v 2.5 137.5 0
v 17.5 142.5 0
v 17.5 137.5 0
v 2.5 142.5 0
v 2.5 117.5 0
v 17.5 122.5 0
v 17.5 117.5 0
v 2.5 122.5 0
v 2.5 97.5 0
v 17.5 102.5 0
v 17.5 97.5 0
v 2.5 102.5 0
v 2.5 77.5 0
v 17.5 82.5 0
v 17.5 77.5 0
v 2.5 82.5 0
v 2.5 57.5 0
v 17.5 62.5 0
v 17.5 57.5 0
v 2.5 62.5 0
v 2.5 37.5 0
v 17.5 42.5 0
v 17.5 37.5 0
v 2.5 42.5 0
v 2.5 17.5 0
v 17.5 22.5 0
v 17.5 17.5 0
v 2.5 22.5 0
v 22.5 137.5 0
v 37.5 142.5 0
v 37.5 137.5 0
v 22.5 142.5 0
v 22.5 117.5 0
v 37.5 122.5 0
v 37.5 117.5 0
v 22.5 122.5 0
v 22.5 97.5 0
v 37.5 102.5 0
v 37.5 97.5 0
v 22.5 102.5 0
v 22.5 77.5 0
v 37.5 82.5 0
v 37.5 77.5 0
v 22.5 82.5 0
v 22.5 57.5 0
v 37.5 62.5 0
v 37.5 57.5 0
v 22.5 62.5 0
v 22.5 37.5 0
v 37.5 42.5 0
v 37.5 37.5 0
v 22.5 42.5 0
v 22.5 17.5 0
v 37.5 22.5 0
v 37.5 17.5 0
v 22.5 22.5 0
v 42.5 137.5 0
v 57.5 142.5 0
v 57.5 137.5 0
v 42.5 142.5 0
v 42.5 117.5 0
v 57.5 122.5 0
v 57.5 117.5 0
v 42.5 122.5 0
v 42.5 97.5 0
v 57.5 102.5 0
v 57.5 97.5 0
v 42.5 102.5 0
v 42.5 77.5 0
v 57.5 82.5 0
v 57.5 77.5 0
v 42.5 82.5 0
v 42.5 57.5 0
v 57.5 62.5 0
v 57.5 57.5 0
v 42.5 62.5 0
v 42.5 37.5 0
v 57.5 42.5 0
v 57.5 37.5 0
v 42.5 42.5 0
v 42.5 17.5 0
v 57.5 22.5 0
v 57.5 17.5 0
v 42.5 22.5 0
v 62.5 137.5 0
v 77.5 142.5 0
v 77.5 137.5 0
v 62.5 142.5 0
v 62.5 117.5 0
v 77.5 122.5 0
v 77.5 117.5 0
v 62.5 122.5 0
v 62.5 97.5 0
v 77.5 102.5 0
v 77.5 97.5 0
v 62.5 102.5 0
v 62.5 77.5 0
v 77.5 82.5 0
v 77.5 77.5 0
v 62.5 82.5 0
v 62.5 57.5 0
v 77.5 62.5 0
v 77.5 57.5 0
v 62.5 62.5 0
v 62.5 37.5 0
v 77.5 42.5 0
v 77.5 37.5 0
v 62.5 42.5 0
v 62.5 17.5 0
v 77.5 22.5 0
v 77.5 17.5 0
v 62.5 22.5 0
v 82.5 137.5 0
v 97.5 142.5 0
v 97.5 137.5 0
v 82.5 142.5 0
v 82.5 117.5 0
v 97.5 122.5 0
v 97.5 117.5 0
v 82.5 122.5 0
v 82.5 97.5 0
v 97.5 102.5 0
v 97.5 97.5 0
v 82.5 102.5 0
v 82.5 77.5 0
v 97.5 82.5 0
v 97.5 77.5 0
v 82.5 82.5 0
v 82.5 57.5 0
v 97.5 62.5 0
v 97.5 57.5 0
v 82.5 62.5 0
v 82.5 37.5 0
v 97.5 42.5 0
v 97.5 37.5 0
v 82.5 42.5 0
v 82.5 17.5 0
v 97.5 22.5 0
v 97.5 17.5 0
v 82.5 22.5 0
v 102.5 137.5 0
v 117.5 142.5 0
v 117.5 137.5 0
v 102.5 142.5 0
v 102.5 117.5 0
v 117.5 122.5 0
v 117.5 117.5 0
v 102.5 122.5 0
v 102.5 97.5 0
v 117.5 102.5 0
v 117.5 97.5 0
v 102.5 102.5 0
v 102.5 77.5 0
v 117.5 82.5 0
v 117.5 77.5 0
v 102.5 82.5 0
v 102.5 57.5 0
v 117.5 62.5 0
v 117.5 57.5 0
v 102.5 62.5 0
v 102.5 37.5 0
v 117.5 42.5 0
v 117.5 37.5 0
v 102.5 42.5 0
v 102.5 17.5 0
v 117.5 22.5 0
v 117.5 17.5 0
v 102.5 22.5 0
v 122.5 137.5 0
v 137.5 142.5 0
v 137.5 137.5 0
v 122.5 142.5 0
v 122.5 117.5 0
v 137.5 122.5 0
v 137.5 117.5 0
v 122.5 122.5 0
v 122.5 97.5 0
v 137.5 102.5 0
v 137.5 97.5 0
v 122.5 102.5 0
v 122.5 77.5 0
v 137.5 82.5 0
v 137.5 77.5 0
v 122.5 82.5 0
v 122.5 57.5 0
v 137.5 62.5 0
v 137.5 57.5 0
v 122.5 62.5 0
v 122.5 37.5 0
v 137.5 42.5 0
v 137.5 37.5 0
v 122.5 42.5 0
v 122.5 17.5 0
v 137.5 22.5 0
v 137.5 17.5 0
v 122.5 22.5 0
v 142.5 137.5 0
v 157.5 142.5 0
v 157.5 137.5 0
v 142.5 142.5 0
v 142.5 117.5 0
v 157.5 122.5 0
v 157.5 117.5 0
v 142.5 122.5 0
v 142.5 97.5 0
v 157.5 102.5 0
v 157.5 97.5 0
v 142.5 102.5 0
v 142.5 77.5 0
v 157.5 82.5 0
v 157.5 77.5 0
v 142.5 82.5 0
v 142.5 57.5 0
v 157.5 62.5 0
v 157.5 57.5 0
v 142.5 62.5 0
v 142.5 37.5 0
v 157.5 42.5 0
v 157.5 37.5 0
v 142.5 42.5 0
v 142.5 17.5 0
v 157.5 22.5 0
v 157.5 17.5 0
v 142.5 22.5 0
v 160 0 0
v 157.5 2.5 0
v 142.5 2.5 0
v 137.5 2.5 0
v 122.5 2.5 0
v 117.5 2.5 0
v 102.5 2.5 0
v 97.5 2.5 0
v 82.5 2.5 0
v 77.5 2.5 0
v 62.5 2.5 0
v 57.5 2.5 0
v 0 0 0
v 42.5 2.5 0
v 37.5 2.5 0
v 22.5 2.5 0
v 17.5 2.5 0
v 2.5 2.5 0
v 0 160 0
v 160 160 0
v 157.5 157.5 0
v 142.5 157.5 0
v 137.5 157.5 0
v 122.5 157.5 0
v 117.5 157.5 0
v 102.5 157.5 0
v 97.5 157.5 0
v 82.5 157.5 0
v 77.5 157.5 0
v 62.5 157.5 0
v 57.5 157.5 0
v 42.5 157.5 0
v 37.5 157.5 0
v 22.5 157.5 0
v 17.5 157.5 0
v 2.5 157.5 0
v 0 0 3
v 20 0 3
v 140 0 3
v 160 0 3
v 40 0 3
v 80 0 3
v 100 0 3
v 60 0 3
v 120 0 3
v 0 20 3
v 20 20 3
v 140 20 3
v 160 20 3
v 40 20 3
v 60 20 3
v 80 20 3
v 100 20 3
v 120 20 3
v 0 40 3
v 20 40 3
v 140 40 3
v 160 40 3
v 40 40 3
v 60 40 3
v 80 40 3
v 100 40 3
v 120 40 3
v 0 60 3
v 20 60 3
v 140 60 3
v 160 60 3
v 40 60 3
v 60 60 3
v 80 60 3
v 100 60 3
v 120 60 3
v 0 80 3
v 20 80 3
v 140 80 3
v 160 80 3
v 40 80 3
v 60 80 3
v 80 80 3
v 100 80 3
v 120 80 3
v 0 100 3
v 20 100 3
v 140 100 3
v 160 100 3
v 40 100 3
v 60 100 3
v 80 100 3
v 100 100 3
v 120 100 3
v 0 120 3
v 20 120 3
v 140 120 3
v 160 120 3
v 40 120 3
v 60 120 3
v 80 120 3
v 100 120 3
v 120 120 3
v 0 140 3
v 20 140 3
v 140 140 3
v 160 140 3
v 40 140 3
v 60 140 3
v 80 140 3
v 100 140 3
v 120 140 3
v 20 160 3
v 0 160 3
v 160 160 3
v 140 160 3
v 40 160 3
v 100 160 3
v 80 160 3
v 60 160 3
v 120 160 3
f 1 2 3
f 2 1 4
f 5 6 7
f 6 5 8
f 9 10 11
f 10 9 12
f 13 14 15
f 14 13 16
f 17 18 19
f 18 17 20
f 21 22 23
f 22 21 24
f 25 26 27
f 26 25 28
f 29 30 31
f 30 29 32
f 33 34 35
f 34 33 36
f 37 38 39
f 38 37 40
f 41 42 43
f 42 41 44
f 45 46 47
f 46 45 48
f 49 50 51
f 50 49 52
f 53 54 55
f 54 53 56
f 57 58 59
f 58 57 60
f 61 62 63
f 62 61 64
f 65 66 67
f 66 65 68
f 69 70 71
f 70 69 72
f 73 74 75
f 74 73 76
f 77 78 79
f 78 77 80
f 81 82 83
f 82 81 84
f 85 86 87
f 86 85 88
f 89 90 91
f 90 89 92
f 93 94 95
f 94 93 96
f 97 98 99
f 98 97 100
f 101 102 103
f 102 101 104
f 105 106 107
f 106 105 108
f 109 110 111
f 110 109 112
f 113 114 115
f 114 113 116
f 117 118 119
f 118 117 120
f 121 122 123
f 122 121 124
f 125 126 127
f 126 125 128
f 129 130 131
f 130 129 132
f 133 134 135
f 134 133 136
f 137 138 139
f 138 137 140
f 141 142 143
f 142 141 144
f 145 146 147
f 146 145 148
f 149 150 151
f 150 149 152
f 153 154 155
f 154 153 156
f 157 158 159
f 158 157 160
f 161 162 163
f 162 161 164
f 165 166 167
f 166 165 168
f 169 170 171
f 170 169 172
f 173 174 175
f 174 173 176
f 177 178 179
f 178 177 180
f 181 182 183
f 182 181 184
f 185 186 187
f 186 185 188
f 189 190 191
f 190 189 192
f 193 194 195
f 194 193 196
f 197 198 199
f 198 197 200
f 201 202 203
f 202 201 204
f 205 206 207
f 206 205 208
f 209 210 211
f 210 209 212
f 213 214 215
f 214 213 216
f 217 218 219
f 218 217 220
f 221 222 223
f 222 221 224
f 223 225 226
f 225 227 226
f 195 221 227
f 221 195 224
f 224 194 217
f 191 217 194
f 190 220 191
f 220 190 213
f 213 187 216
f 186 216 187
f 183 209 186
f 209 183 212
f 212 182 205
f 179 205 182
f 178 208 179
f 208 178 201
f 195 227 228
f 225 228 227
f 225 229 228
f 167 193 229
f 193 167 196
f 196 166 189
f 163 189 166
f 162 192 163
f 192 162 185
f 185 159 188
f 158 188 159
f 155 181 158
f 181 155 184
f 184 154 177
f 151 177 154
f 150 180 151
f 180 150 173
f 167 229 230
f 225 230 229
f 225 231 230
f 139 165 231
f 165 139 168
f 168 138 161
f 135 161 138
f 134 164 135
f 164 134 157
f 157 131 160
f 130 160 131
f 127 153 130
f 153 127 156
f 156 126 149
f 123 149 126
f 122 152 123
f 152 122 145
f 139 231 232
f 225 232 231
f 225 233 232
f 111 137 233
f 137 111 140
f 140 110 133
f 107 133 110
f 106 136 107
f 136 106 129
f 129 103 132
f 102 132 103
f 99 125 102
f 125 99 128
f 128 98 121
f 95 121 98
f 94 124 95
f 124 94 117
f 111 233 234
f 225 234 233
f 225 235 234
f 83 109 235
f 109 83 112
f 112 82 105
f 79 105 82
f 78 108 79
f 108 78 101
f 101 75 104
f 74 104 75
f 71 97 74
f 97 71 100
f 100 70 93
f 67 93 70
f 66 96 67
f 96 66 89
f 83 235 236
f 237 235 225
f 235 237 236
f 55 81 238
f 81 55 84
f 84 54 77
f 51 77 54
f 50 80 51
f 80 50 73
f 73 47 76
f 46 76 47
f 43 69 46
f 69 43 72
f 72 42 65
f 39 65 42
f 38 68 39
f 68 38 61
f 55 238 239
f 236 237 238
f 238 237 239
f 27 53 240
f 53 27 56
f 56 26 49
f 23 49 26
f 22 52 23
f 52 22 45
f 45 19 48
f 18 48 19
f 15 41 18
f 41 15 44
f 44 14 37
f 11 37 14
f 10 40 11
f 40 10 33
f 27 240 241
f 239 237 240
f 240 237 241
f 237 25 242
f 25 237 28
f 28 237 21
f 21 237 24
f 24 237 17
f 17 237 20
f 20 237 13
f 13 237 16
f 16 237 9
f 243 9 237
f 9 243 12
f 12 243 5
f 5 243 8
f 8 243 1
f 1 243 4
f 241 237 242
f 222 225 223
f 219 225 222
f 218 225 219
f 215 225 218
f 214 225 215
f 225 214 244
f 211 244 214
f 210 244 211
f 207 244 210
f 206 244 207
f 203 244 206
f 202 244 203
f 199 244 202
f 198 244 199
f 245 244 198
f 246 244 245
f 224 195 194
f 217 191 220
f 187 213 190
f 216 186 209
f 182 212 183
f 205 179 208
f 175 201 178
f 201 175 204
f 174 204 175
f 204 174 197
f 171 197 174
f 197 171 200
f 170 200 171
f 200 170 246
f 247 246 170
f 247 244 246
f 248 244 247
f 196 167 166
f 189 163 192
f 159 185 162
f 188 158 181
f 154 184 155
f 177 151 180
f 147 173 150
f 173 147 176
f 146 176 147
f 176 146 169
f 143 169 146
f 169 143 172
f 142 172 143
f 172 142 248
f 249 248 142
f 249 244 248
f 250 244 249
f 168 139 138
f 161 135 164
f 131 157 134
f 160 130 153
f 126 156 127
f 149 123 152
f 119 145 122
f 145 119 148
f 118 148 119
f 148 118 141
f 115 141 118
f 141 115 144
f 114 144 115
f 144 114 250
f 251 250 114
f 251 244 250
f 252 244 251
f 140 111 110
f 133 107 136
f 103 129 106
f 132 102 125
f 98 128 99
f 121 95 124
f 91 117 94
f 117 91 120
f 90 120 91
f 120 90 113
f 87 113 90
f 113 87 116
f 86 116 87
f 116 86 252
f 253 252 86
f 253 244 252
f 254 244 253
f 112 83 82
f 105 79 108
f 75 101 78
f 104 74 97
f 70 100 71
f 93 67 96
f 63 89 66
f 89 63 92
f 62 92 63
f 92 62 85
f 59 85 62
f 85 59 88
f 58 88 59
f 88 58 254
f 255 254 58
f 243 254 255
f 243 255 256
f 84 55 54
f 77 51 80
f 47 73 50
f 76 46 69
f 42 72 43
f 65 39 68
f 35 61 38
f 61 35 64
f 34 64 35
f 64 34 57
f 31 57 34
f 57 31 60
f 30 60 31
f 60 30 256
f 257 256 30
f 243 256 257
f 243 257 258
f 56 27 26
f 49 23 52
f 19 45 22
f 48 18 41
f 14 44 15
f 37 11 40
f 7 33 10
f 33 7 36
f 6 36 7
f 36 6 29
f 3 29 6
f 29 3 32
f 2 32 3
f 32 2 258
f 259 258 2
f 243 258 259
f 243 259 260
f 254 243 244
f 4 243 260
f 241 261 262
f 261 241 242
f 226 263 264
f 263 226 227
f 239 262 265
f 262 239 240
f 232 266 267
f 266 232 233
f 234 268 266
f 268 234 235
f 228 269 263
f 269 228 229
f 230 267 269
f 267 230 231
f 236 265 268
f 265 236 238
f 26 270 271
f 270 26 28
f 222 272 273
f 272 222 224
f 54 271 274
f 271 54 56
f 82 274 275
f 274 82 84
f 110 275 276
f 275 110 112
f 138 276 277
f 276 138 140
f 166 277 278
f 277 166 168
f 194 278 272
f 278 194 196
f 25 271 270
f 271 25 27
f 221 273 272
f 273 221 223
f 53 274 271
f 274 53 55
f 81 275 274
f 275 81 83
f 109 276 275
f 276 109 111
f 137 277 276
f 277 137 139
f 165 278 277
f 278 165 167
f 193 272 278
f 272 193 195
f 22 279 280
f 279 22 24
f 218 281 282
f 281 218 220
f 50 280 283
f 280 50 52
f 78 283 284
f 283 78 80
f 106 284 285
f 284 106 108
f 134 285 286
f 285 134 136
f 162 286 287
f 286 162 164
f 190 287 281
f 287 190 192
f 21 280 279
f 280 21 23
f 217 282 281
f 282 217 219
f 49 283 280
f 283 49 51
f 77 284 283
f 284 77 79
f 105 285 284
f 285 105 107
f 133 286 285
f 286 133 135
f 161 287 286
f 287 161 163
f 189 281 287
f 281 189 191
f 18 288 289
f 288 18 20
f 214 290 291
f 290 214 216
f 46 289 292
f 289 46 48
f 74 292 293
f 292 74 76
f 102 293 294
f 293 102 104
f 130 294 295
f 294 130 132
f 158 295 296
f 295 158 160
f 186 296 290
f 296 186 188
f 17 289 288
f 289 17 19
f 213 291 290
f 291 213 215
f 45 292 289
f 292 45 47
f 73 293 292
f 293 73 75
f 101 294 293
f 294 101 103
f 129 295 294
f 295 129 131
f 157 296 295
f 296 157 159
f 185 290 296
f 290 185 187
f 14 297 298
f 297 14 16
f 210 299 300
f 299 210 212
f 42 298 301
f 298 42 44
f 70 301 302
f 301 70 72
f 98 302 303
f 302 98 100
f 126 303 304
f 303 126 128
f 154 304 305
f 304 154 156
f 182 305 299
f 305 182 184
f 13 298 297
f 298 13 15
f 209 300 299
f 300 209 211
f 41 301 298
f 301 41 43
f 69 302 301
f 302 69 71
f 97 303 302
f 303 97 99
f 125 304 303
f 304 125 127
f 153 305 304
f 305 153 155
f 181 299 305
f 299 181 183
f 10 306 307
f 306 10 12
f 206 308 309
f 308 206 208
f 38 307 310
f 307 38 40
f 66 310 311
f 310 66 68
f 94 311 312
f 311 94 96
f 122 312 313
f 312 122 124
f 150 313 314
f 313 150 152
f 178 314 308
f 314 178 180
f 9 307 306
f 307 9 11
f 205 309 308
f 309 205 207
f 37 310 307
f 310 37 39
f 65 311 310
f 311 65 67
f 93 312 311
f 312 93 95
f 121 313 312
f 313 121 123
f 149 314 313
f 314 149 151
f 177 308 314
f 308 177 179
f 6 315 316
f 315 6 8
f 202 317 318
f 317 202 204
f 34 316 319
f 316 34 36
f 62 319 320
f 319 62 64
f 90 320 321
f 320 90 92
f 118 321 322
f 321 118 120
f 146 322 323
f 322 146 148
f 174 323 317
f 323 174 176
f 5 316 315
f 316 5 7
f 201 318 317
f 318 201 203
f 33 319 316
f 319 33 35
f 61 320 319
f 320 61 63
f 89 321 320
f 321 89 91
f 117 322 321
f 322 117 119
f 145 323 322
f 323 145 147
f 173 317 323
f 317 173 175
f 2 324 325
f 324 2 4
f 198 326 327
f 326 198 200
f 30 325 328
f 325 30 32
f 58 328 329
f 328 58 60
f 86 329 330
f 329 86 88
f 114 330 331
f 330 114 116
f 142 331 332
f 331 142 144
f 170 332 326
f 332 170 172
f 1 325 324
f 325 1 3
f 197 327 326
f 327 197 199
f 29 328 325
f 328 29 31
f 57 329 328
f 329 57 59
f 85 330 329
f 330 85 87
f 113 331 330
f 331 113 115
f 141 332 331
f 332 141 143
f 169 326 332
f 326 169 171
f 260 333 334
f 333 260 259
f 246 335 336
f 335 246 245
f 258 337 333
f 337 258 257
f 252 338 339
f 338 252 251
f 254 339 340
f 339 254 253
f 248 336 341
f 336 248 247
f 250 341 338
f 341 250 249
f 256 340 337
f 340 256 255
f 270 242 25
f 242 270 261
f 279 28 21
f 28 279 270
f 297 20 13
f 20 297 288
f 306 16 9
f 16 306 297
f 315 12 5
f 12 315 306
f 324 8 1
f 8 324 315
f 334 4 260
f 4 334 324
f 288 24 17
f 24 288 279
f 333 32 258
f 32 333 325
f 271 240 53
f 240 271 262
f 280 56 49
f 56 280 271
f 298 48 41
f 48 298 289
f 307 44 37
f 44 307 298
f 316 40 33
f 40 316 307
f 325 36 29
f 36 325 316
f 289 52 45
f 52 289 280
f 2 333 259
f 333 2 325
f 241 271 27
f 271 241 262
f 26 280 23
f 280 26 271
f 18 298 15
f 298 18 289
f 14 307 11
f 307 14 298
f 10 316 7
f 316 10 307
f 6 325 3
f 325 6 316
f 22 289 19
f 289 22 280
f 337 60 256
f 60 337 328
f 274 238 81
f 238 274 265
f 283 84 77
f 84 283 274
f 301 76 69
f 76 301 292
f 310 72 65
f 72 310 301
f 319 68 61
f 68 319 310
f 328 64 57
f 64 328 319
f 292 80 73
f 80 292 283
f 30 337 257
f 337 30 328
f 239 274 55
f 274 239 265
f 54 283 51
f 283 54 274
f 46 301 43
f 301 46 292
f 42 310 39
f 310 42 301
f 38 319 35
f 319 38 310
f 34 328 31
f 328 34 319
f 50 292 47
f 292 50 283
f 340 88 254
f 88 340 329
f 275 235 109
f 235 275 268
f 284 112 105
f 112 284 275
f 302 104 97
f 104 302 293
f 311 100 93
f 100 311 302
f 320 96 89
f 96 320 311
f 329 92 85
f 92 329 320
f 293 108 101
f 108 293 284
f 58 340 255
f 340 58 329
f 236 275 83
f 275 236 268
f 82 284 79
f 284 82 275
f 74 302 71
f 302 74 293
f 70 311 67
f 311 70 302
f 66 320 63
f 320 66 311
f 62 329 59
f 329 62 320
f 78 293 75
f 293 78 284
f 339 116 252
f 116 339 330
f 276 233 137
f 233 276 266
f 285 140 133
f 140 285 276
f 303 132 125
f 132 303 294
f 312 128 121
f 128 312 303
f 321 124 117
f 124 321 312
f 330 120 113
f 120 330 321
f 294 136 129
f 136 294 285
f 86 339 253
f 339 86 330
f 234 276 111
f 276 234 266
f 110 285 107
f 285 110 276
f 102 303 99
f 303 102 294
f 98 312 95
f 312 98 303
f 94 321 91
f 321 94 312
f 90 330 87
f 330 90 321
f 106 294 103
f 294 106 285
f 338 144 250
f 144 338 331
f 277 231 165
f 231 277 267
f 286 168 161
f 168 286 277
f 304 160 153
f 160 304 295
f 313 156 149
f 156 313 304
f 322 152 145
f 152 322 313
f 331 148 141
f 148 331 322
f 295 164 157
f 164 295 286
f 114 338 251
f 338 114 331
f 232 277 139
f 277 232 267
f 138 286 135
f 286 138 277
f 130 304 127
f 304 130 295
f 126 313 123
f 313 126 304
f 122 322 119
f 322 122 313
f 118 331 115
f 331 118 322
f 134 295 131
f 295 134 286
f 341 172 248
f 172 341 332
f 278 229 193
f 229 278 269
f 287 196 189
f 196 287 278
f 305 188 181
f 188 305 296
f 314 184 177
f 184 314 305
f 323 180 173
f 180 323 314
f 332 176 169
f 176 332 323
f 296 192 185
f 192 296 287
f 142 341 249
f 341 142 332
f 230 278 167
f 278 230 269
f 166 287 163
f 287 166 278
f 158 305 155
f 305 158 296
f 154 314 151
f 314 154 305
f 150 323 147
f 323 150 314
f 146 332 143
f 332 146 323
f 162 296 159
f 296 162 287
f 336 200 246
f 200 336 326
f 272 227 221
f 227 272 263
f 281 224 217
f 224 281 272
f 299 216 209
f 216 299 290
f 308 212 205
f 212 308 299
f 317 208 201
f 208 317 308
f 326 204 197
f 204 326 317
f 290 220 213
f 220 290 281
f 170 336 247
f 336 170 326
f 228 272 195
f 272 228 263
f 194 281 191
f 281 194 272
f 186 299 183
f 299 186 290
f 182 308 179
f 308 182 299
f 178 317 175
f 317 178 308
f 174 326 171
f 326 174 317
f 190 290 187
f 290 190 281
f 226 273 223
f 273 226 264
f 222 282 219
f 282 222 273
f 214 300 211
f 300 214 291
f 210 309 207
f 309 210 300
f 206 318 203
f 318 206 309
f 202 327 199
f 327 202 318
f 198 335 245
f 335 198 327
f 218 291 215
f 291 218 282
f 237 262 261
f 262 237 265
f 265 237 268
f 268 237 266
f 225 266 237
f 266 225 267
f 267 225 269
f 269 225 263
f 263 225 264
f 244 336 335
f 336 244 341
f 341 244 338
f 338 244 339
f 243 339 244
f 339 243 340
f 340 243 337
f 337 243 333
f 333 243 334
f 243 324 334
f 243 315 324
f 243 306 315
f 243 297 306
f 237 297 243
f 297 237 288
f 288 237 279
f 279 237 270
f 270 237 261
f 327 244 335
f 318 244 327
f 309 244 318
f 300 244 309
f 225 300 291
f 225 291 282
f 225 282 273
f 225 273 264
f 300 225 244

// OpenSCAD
// file: ../common.scad
BASE_TILE_SIZE=20;
BASE_WIDTH=5;
PEAK_HEIGHT=3;

BOX_HEIGHT = 69;
BOX_CLEARENCE = 15.75;

function box_height() = BOX_HEIGHT;
function box_clearence() = BOX_CLEARENCE;
function max_height() = BOX_HEIGHT - BOX_CLEARENCE;

function y_up() = [90, 0, 0];
function x_up() = [90, 0, 90];

function min_floor_offset(wall_width) = wall_width + PEAK_HEIGHT;
function tri_mid() = BASE_WIDTH / 2;
function triangle() = [[0, 0],[BASE_WIDTH, 0],[tri_mid(), PEAK_HEIGHT]];
function base_tile_size() = BASE_TILE_SIZE;
function peak_height() = PEAK_HEIGHT;

module grid(width, depth, direction) {
    length = (direction == "x") ? width : depth;
    slot_length = (direction == "x") ? depth : width;
    translate_z = (direction == "x") ? -slot_length : 0;
    rot = (direction == "x") ? y_up() : x_up();

    // This is the total additional slots past the initial one
    total_slots = floor(length / BASE_TILE_SIZE);
    
    for (i = [0 : total_slots]) {
        offset = -tri_mid() + BASE_TILE_SIZE * i;
        rotate(rot)
        translate([offset, 0, translate_z])
        linear_extrude(height = slot_length)
        polygon(points=triangle());
    }
}

module grid_slots(width, depth) {
    grid(width, depth, "y");
    grid(width, depth, "x");
}
// file: ../grid_base.scad
use <common.scad>

TILE_COLUMNS=7;
TILE_ROWS=8;

module grid_base(columns, rows) {
    total_width = base_tile_size() * columns;
    total_depth = base_tile_size() * rows;

    module perimeter() {
        union() {
            // front
            translate([0, -tri_mid(), 0])
            cube([total_width, tri_mid(), peak_height()]);

            // back
            translate([0, total_depth, 0])
            cube([total_width, tri_mid(), peak_height()]);

            // left
            rotate([0, 0, 90])
            cube([total_depth, tri_mid(), peak_height()]);

            // right
            rotate([0, 0, 90])
            translate([0, -(total_width + tri_mid()), 0])
            cube([total_depth, tri_mid(), peak_height()]);
        }
    }

    difference() {
        grid_slots(total_width, total_depth);
        perimeter();
    }
}
// main file
use <../grid_base.scad>

// For prusa mini, need to print four different grids

grid_base(8, 8);
//grid_base(8, 7);
//grid_base(3, 8);
//grid_base(3, 7);
